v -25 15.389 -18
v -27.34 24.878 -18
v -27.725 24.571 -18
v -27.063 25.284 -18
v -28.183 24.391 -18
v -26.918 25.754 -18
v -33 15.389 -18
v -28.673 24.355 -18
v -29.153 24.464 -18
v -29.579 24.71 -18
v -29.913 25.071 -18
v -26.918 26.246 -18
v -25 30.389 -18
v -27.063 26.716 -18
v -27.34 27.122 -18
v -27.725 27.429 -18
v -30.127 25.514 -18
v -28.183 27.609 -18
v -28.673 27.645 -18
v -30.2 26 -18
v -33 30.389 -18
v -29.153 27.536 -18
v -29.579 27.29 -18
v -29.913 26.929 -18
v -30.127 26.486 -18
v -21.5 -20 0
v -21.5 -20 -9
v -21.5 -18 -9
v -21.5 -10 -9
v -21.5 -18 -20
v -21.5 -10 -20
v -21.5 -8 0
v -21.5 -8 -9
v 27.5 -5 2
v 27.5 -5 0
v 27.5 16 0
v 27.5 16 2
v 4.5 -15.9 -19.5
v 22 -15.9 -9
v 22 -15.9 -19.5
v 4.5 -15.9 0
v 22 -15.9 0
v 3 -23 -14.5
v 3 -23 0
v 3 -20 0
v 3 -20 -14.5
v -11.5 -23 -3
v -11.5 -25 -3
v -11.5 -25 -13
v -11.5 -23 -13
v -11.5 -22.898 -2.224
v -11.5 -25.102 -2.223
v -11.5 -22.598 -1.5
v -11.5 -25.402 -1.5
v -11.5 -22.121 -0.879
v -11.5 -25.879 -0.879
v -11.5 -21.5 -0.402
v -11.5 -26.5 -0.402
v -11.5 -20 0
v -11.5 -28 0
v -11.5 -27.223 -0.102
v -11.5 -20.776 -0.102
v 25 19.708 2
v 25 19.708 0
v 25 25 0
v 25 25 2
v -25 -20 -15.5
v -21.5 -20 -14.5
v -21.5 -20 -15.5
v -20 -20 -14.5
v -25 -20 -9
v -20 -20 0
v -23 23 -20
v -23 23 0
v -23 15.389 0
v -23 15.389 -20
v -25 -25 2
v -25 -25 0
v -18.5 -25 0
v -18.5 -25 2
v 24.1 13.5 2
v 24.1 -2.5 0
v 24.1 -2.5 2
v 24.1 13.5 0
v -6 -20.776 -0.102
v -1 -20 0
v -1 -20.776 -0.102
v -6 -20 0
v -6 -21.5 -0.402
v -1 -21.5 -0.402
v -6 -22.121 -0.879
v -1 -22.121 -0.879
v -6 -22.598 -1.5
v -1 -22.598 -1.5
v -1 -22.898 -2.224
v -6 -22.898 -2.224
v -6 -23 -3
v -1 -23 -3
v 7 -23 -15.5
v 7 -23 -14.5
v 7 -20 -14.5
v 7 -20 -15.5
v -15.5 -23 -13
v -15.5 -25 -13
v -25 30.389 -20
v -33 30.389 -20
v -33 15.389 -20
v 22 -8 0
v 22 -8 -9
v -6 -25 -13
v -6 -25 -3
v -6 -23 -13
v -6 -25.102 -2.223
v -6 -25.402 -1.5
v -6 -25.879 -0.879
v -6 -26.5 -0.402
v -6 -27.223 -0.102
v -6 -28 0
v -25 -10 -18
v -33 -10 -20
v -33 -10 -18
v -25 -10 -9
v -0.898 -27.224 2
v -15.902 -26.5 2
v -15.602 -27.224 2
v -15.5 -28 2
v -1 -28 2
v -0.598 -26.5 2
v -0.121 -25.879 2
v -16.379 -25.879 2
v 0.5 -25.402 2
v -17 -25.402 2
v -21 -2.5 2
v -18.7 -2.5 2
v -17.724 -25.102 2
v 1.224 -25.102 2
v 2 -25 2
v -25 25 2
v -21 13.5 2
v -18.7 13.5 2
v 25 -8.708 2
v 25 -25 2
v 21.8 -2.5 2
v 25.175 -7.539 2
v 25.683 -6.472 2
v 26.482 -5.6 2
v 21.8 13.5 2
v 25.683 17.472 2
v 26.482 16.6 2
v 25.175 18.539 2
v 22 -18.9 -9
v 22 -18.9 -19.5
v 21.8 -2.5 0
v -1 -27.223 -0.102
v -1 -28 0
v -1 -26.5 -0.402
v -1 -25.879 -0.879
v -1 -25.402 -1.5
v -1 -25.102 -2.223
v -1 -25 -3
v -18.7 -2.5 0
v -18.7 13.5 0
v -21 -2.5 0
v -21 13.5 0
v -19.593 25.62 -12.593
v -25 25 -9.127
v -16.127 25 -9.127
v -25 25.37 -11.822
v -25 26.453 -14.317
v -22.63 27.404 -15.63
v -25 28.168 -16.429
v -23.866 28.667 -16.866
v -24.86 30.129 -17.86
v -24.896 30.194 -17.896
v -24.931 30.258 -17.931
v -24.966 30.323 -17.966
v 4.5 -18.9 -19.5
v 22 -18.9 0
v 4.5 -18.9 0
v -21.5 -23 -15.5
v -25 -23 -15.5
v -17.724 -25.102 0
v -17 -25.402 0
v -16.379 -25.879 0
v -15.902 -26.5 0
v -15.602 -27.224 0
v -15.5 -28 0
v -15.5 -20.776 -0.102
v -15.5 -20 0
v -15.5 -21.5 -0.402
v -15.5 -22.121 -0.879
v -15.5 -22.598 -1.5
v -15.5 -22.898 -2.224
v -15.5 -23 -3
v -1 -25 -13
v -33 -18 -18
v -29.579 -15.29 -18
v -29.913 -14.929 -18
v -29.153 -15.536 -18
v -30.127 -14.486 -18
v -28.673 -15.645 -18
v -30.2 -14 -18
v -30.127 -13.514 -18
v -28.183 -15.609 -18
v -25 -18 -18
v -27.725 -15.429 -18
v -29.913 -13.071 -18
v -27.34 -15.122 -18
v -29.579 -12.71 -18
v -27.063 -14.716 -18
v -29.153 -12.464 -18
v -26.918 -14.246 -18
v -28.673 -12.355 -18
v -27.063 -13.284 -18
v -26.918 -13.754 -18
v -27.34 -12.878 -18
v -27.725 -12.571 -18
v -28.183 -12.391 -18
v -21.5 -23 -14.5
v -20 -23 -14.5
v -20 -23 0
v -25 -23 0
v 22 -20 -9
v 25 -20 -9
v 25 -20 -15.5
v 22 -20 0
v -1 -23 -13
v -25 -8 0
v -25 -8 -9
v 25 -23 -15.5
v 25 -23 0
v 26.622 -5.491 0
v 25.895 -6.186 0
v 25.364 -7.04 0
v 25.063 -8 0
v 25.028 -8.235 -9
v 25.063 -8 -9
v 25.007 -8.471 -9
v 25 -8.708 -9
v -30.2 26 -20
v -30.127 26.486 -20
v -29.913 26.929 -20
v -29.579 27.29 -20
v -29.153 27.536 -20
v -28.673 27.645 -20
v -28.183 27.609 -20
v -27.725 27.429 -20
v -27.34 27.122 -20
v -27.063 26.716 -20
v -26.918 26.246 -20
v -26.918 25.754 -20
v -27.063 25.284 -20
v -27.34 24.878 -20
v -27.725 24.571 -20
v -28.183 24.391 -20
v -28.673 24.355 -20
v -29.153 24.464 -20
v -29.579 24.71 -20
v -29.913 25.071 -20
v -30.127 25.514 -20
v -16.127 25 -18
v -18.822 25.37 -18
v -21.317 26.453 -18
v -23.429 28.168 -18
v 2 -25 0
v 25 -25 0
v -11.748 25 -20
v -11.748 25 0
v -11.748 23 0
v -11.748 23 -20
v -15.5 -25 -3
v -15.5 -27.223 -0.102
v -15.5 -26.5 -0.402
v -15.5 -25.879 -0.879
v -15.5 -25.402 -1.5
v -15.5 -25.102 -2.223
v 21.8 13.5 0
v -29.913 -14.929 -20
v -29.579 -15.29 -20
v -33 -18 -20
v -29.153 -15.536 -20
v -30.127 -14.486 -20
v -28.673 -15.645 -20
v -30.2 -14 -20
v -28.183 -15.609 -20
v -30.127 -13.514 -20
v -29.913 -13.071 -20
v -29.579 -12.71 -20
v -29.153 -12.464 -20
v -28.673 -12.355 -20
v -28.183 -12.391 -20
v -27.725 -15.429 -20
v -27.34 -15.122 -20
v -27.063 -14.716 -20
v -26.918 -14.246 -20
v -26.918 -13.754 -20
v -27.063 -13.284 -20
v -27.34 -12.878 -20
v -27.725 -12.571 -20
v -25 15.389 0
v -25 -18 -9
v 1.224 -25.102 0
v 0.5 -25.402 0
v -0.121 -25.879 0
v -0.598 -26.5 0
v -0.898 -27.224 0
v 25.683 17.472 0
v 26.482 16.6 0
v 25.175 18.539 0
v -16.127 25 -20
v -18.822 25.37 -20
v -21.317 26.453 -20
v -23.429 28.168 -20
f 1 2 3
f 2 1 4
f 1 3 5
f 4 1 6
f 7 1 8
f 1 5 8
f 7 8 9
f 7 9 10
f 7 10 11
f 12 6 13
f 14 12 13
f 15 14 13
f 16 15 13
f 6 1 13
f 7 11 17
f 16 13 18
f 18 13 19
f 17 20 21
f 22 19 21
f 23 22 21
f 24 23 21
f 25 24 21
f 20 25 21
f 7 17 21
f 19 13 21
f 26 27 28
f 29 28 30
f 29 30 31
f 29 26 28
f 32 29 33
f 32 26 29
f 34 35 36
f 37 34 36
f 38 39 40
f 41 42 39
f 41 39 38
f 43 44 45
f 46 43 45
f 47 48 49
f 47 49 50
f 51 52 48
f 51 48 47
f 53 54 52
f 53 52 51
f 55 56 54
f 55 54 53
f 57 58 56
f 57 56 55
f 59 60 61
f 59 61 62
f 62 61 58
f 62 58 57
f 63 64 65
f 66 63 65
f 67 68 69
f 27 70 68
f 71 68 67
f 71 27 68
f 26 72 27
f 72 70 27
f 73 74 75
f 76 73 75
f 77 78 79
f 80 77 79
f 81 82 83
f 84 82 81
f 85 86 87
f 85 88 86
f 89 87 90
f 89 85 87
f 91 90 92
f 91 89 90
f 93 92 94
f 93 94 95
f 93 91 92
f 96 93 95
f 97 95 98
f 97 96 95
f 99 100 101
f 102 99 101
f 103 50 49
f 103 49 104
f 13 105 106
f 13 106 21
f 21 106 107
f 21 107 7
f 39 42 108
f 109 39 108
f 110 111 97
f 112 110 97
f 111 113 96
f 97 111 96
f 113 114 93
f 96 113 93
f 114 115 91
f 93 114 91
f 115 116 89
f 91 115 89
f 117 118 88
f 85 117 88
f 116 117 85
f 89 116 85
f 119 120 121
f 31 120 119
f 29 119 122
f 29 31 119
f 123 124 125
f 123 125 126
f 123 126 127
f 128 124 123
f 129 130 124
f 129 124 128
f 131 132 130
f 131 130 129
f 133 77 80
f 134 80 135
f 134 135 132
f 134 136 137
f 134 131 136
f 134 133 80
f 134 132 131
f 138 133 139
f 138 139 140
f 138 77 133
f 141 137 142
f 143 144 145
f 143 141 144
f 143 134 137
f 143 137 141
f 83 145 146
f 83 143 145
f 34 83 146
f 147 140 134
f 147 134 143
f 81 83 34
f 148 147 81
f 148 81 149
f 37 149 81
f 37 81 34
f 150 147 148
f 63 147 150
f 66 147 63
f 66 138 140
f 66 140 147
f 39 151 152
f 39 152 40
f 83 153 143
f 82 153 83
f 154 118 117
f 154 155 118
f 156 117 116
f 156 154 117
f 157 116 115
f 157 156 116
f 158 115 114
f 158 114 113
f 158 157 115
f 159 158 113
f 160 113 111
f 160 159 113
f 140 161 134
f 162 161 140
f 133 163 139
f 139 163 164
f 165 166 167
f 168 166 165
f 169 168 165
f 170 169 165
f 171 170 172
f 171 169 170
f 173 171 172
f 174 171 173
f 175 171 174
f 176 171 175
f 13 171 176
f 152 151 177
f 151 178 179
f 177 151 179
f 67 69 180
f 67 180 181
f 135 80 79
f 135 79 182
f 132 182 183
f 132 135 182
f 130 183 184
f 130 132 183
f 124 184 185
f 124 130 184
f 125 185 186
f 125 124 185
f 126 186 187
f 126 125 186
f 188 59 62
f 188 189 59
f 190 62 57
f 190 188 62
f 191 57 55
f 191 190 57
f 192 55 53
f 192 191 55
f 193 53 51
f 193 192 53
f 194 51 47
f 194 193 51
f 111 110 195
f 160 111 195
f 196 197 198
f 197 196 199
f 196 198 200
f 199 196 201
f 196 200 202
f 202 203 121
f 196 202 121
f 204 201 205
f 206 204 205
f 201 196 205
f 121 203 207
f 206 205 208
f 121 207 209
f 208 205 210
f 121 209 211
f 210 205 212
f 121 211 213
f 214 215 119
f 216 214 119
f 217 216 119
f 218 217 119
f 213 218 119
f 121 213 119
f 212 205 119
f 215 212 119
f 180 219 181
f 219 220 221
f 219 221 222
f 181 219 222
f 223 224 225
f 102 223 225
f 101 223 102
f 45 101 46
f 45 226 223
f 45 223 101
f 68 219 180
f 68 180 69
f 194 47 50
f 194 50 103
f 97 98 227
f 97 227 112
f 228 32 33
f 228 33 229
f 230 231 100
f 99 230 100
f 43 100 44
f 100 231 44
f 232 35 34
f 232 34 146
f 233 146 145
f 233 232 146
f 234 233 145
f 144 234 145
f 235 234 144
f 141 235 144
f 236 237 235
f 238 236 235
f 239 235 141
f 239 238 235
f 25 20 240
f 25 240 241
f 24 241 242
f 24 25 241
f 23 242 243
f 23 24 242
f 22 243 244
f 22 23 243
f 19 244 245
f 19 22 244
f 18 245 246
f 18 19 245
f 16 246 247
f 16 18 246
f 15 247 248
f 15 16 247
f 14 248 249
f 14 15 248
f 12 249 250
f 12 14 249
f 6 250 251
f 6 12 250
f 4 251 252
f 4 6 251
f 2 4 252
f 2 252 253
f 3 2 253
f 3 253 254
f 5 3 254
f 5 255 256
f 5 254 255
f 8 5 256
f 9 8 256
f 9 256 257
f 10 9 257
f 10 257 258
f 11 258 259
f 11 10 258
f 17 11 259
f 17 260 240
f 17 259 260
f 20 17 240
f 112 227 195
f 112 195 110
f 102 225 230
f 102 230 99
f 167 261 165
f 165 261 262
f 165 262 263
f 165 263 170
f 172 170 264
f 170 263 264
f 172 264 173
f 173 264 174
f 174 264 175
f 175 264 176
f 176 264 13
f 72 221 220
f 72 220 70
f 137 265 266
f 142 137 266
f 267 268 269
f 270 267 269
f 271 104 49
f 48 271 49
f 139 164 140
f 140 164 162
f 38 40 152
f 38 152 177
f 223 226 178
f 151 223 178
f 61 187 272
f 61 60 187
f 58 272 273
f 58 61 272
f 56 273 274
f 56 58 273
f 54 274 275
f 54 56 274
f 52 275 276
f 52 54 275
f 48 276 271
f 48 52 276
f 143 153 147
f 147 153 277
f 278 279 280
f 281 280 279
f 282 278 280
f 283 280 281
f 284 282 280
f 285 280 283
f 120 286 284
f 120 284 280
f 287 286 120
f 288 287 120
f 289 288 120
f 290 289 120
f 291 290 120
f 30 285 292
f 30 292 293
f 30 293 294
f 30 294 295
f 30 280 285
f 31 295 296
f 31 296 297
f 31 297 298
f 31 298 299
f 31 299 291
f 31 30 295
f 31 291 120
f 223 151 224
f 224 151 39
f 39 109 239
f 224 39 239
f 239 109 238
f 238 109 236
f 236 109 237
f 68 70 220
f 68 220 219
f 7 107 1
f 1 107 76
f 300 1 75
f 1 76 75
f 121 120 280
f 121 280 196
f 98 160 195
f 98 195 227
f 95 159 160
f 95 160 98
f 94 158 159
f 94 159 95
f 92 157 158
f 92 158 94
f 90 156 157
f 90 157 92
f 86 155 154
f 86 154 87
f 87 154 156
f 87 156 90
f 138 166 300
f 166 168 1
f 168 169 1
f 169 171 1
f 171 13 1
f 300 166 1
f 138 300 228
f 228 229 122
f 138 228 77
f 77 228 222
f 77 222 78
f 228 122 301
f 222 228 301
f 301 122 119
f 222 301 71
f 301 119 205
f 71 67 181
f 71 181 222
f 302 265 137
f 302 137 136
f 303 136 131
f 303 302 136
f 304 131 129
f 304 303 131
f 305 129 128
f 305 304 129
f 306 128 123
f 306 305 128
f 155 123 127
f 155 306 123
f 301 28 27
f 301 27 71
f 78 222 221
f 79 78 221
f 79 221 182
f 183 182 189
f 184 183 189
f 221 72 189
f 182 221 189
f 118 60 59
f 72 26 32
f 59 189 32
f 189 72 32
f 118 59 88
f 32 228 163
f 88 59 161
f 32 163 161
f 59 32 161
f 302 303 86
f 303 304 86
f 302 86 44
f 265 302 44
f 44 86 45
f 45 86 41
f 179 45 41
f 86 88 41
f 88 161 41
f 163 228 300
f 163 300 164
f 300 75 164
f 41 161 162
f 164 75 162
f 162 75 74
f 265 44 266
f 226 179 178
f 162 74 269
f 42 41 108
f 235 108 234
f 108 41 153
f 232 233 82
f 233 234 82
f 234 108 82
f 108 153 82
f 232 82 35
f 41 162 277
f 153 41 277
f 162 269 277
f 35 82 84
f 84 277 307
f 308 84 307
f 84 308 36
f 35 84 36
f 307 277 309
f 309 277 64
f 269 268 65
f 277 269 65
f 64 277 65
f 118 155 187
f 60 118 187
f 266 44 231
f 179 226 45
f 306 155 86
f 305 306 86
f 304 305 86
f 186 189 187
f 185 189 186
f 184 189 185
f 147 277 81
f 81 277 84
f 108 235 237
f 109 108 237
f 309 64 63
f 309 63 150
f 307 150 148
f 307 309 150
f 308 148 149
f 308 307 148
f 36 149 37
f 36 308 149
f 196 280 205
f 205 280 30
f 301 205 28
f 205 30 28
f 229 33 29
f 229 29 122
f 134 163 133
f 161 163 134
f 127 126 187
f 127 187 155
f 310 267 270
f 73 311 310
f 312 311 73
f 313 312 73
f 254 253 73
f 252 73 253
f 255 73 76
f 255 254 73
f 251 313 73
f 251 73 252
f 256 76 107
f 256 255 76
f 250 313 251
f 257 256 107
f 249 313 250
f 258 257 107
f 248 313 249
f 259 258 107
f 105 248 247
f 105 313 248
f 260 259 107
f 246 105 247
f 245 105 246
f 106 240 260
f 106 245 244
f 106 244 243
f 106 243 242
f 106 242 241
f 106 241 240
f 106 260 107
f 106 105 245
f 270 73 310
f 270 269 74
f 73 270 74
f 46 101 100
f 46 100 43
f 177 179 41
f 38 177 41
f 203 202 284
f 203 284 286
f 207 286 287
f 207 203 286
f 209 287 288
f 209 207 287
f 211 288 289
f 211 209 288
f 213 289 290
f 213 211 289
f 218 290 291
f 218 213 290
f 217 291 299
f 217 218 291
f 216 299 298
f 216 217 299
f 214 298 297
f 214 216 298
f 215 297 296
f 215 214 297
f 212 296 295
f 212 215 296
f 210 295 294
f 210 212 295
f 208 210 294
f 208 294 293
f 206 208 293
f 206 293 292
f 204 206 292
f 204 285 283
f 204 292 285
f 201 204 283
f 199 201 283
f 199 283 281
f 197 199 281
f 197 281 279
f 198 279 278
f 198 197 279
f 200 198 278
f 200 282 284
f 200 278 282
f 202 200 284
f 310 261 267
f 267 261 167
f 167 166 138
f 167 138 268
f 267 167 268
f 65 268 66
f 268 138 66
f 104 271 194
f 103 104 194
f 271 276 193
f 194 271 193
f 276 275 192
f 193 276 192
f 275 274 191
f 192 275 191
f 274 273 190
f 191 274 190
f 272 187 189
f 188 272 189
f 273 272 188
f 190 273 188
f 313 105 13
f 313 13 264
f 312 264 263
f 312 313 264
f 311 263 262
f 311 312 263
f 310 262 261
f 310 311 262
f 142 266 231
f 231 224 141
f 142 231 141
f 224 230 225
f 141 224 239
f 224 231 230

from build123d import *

# Parameters (mm, degrees)
SKETCH1_W               = 50
SKETCH1_H               = 50
BOSS_EXTRUDE1_DEPTH     = 2
CUT_EXTRUDE1_DEPTH      = 36.411862419
CUT_EXTRUDE1_DEPTH_BACK = 36.411862419
SKETCH2_W               = 2.3
SKETCH2_H               = 16
SKETCH3_W               = 22
SKETCH3_H               = 3
SKETCH3_W_2             = 5
BOSS_EXTRUDE2_DEPTH     = 14.5
SKETCH4_W               = 5
SKETCH4_H               = 2
SKETCH4_W_2             = 4
BOSS_EXTRUDE11_DEPTH    = 13
SKETCH5_W               = 3.5
SKETCH5_H               = 3
SKETCH5_W_2             = 18
BOSS_EXTRUDE12_DEPTH    = 1
SKETCH6_W               = 3.5
SKETCH6_H               = 12
SKETCH6_W_2             = 3
BOSS_EXTRUDE13_DEPTH    = 9
SKETCH7_W               = 3.5
SKETCH7_H               = 8
BOSS_EXTRUDE14_DEPTH    = 11
SKETCH8_W               = 2
SKETCH8_H               = 8
BOSS_EXTRUDE15_DEPTH    = 8
BOSS_EXTRUDE16_DEPTH    = 20
SKETCH10_W              = 2
SKETCH10_H              = 15
BOSS_EXTRUDE17_DEPTH    = 8
FILLET1_R               = 10
FILLET2_START           = -18
FILLET2_DEPTH           = 0.13972
FILLET2_START_2         = -17.86028
FILLET2_2_DEPTH         = 8.733515347
FILLET2_START_3         = -25
FILLET2_3_DEPTH         = 8.873235347
CUT_EXTRUDE2_DEPTH      = 50.964612469
CUT_EXTRUDE2_DEPTH_BACK = 50.964612469
SKETCH11_R              = 1.65
SKETCH13_W              = 2.5
SKETCH13_H              = 21
BOSS_EXTRUDE18_DEPTH    = 2
FILLET3_R               = 4
SKETCH14_W              = 17.5
SKETCH14_H              = 3
BOSS_EXTRUDE19_DEPTH    = 19.5
FILLET4_R               = 3
SKETCH15_W              = 14.5
SKETCH15_H              = 2
BOSS_EXTRUDE20_DEPTH    = 3
FILLET5_R               = 3
FILLET6_R               = 3


with BuildPart() as part:
    # Sketch1 → Boss-Extrude1 (new body)
    with BuildSketch(Plane.XY):
        Rectangle(SKETCH1_W, SKETCH1_H)
    extrude(amount=BOSS_EXTRUDE1_DEPTH)

    # Sketch2 → Cut-Extrude1 (cut, two sides: drawn at the far end of the back side and taken through both)
    with BuildSketch(Plane.XY.offset(2).offset(-CUT_EXTRUDE1_DEPTH_BACK)):
        with Locations((-19.85, 5.5)):
            Rectangle(SKETCH2_W, SKETCH2_H)
        with Locations((22.95, 5.5)):
            Rectangle(SKETCH2_W, SKETCH2_H)
    extrude(amount=CUT_EXTRUDE1_DEPTH + CUT_EXTRUDE1_DEPTH_BACK, mode=Mode.SUBTRACT)

    # Sketch3 → Boss-Extrude2 (add)
    with BuildSketch(Plane(origin=(0, 0, 0), x_dir=(-1, 0, 0), z_dir=(0, 0, -1))):
        with Locations((-14, -21.5)):
            Rectangle(SKETCH3_W, SKETCH3_H)
        with Locations((22.5, -21.5)):
            Rectangle(SKETCH3_W_2, SKETCH3_H)
    extrude(amount=BOSS_EXTRUDE2_DEPTH)

    # Sketch4 → Boss-Extrude11 (add)
    with BuildSketch(Plane(origin=(0, 0, 0), x_dir=(-1, 0, 0), z_dir=(0, 0, -1))):
        with Locations((3.5, -24)):
            Rectangle(SKETCH4_W, SKETCH4_H)
        with Locations((13.5, -24)):
            Rectangle(SKETCH4_W_2, SKETCH4_H)
    extrude(amount=BOSS_EXTRUDE11_DEPTH)

    # Sketch5 → Boss-Extrude12 (add)
    with BuildSketch(Plane(origin=(0, 0, -14.5), x_dir=(-1, 0, 0), z_dir=(0, 0, -1))):
        with Locations((23.25, -21.5)):
            Rectangle(SKETCH5_W, SKETCH5_H)
        with Locations((-16, -21.5)):
            Rectangle(SKETCH5_W_2, SKETCH5_H)
    extrude(amount=BOSS_EXTRUDE12_DEPTH)

    # Sketch6 → Boss-Extrude13 (add)
    with BuildSketch(Plane(origin=(0, 0, 0), x_dir=(-1, 0, 0), z_dir=(0, 0, -1))):
        with Locations((23.25, -14)):
            Rectangle(SKETCH6_W, SKETCH6_H)
        with Locations((-23.5, -14)):
            Rectangle(SKETCH6_W_2, SKETCH6_H)
    extrude(amount=BOSS_EXTRUDE13_DEPTH)

    # Sketch7 → Boss-Extrude14 (add)
    with BuildSketch(Plane(origin=(0, 0, -9), x_dir=(-1, 0, 0), z_dir=(0, 0, -1))):
        with Locations((23.25, -14)):
            Rectangle(SKETCH7_W, SKETCH7_H)
    extrude(amount=BOSS_EXTRUDE14_DEPTH)

    # Sketch8 → Boss-Extrude15 (add)
    with BuildSketch(Plane.ZY.offset(25)):
        with Locations((-19, -14)):
            Rectangle(SKETCH8_W, SKETCH8_H)
    extrude(amount=BOSS_EXTRUDE15_DEPTH)

    # Sketch9 → Boss-Extrude16 (add)
    with BuildSketch(Plane(origin=(0, 0, 0), x_dir=(-1, 0, 0), z_dir=(0, 0, -1))):
        Polygon((11.748068925, 25), (11.748068925, 23), (23, 23), (23, 15.388525781), (25, 15.388525781), (25, 25), align=None)
    extrude(amount=BOSS_EXTRUDE16_DEPTH)

    # Sketch10 → Boss-Extrude17 (add)
    with BuildSketch(Plane.ZY.offset(25)):
        with Locations((-19, 22.888525781)):
            Rectangle(SKETCH10_W, SKETCH10_H)
    extrude(amount=BOSS_EXTRUDE17_DEPTH)

    # Fillet1
    # the kernel refuses this fillet: 10 mm, written as the material it adds along each edge
    with BuildSketch(Plane(origin=(-25, 25, -20), x_dir=(1, 0, 0), z_dir=(0, 0, 1))) as fillet1_piece_1:
        with BuildLine():
            CenterArc((8.873235347, 10), FILLET1_R, 207.461173358, 62.538826642)
            Line((0, 5.388525781), (0, 0))
            Line((0, 0), (8.873235347, 0))
        make_face()
    extrude(amount=2)

    # Fillet2: read off the stored shape, not the designer's step
    # Fillet2 outline → Fillet2 (add)
    with BuildSketch(Plane.XY.offset(FILLET2_START)):
        with BuildLine():
            Line((-25, 30.388525781), (-25, 25))
            Line((-25, 25), (-16.126764653, 25))
            ThreePointArc((-16.126764653, 25), (-21.317393604, 26.452639525), (-25, 30.388525781))
        make_face()
    extrude(amount=FILLET2_DEPTH)

    # Fillet2 2 outline → Fillet2 2 (add)
    with BuildSketch(Plane.XY.offset(FILLET2_START_2)):
        with BuildLine():
            Line((-25, 30.388525781), (-25, 25))
            Line((-25, 25), (-16.126764653, 25))
            ThreePointArc((-16.126764653, 25), (-21.317393604, 26.452639525), (-25, 30.388525781))
        make_face()
    extrude(amount=FILLET2_2_DEPTH)

    # Fillet2 3 outline → Fillet2 3 (cut)
    with BuildSketch(Plane.YZ.offset(FILLET2_START_3)):
        with BuildLine():
            ThreePointArc((25, -9.126764653), (26.452639525, -14.317393604), (30.388525781, -18))
            Line((30.388525781, -18), (32, -18.837492924))
            Line((32, -18.837492924), (32, -9.126764653))
            Line((32, -9.126764653), (25, -9.126764653))
        make_face()
    extrude(amount=FILLET2_3_DEPTH, mode=Mode.SUBTRACT)

    # Sketch11 → Cut-Extrude2 (cut, two sides: drawn at the far end of the back side and taken through both)
    with BuildSketch(Plane(origin=(0, 0, -20), x_dir=(-1, 0, 0), z_dir=(0, 0, -1)).offset(-CUT_EXTRUDE2_DEPTH_BACK)):
        with Locations((28.55, 26)):
            Circle(SKETCH11_R)
        with Locations((28.55, -14)):
            Circle(SKETCH11_R)
    extrude(amount=CUT_EXTRUDE2_DEPTH + CUT_EXTRUDE2_DEPTH_BACK, mode=Mode.SUBTRACT)

    # Sketch13 → Boss-Extrude18 (add)
    with BuildSketch(Plane(origin=(0, 0, 0), x_dir=(-1, 0, 0), z_dir=(0, 0, -1))):
        with Locations((-26.25, 5.5)):
            Rectangle(SKETCH13_W, SKETCH13_H)
    extrude(amount=-BOSS_EXTRUDE18_DEPTH)

    # Fillet3
    # the kernel refuses this fillet: 4 mm, written as the material it adds along each edge
    with BuildSketch(Plane(origin=(25, -5, -9.270248109), x_dir=(0, -1, 0), z_dir=(0, 0, 1))) as fillet3_piece_1_section:
        with BuildLine():
            CenterArc((3.708099244, 4), FILLET3_R, 202.024312837, 67.975687163)
            Line((0, 2.5), (-0.074161985, 2.47))
            ThreePointArc((-0.074161985, 2.47), (-0.08, 1.25), (-0.08, 0))
            Line((-0.08, 0), (0, -0.08))
            Line((0, -0.08), (3.708099244, -0.08))
            Line((3.708099244, -0.08), (3.708099244, 0))
        make_face()
    fillet3_piece_1 = extrude(amount=11.270248109, mode=Mode.PRIVATE)
    fillet3_piece_1 = split(fillet3_piece_1, bisect_by=Plane(origin=(25, -5, 0), z_dir=(0, 0, -1)), keep=Keep.TOP, mode=Mode.PRIVATE)
    fillet3_piece_1 = split(fillet3_piece_1, bisect_by=Plane(origin=(25, -8, -9.270248109), z_dir=(0, -1, 0)), keep=Keep.TOP, mode=Mode.PRIVATE)
    fillet3_piece_1 = split(fillet3_piece_1, bisect_by=Plane(origin=(25, -5, -9), z_dir=(0, 0, 1)), keep=Keep.TOP, mode=Mode.PRIVATE)
    add(fillet3_piece_1)
    with BuildSketch(Plane(origin=(25, -5, 0), x_dir=(0, -1, 0), z_dir=(0, 0, 1))) as fillet3_piece_2_section:
        with BuildLine():
            CenterArc((3.708099244, 4), FILLET3_R, 202.024312837, 67.975687163)
            Line((0, 2.5), (-0.074161985, 2.47))
            ThreePointArc((-0.074161985, 2.47), (-0.08, 1.25), (-0.08, 0))
            Line((-0.08, 0), (0, -0.08))
            Line((0, -0.08), (3.708099244, -0.08))
            Line((3.708099244, -0.08), (3.708099244, 0))
        make_face()
    fillet3_piece_2 = extrude(amount=2, mode=Mode.PRIVATE)
    fillet3_piece_2 = split(fillet3_piece_2, bisect_by=Plane(origin=(25, -8, 0), z_dir=(0, -1, 0)), keep=Keep.TOP, mode=Mode.PRIVATE)
    add(fillet3_piece_2)
    with BuildSketch(Plane(origin=(25, -5, 0), x_dir=(0, -1, 0), z_dir=(0, 0, 1))) as fillet3_piece_3_section:
        with BuildLine():
            CenterArc((3.708099244, 4), FILLET3_R, 202.024312837, 67.975687163)
            Line((0, 2.5), (-0.074161985, 2.47))
            ThreePointArc((-0.074161985, 2.47), (-0.08, 1.25), (-0.08, 0))
            Line((-0.08, 0), (0, -0.08))
            Line((0, -0.08), (3.708099244, -0.08))
            Line((3.708099244, -0.08), (3.708099244, 0))
        make_face()
    fillet3_piece_3 = extrude(amount=2, mode=Mode.PRIVATE)
    fillet3_piece_3 = split(fillet3_piece_3, bisect_by=Plane(origin=(25, -8, 0), z_dir=(0, 1, 0)), keep=Keep.TOP, mode=Mode.PRIVATE)
    add(fillet3_piece_3)
    with BuildSketch(Plane(origin=(25, 16, 0), x_dir=(0, 1, 0), z_dir=(0, 0, 1))) as fillet3_piece_4:
        with BuildLine():
            CenterArc((3.708099244, -4), FILLET3_R, 90, 67.975687163)
            Line((0, -2.5), (-0.074161985, -2.47))
            ThreePointArc((-0.074161985, -2.47), (-0.08, -1.25), (-0.08, 0))
            Line((-0.08, 0), (0, 0.08))
            Line((0, 0.08), (3.708099244, 0.08))
            Line((3.708099244, 0.08), (3.708099244, 0))
        make_face()
    extrude(amount=2)

    # Sketch14 → Boss-Extrude19 (add)
    with BuildSketch(Plane(origin=(0, 0, 0), x_dir=(-1, 0, 0), z_dir=(0, 0, -1))):
        with Locations((-13.25, -17.4)):
            Rectangle(SKETCH14_W, SKETCH14_H)
    extrude(amount=BOSS_EXTRUDE19_DEPTH)

    # Fillet4
    fillet4_edges = [part.edges().sort_by_distance(p)[0] for p in [
        (-3.5, -23, 0),
        (-13.5, -23, 0),
    ]]
    fillet(fillet4_edges, radius=FILLET4_R)

    # Sketch15 → Boss-Extrude20 (add)
    with BuildSketch(Plane.XZ.offset(25)):
        with Locations((-8.25, 1)):
            Rectangle(SKETCH15_W, SKETCH15_H)
    extrude(amount=BOSS_EXTRUDE20_DEPTH)

    # Fillet5
    # the kernel refuses this fillet: 3 mm, written as the material it adds along each edge
    with BuildSketch(Plane(origin=(-15.5, -25, 2), x_dir=(-1, 0, 0), z_dir=(0, 0, -1)), Plane(origin=(-1, -25, 0), x_dir=(1, 0, 0), z_dir=(0, 0, 1))) as fillet5_piece_1:
        with BuildLine():
            CenterArc((FILLET5_R, -FILLET5_R), FILLET5_R, 90, 90)
            Line((0, -FILLET5_R), (0, 0))
            Line((0, 0), (FILLET5_R, 0))
        make_face()
    extrude(amount=2)

    # Fillet6
    fillet6_edges = [part.edges().sort_by_distance(p)[0] for p in [
        (-3.5, -25, 0),
        (-13.5, -25, 0),
    ]]
    fillet(fillet6_edges, radius=FILLET6_R - 0.0001)  # a hair under: the kernel refuses the full size


solid = part.part
